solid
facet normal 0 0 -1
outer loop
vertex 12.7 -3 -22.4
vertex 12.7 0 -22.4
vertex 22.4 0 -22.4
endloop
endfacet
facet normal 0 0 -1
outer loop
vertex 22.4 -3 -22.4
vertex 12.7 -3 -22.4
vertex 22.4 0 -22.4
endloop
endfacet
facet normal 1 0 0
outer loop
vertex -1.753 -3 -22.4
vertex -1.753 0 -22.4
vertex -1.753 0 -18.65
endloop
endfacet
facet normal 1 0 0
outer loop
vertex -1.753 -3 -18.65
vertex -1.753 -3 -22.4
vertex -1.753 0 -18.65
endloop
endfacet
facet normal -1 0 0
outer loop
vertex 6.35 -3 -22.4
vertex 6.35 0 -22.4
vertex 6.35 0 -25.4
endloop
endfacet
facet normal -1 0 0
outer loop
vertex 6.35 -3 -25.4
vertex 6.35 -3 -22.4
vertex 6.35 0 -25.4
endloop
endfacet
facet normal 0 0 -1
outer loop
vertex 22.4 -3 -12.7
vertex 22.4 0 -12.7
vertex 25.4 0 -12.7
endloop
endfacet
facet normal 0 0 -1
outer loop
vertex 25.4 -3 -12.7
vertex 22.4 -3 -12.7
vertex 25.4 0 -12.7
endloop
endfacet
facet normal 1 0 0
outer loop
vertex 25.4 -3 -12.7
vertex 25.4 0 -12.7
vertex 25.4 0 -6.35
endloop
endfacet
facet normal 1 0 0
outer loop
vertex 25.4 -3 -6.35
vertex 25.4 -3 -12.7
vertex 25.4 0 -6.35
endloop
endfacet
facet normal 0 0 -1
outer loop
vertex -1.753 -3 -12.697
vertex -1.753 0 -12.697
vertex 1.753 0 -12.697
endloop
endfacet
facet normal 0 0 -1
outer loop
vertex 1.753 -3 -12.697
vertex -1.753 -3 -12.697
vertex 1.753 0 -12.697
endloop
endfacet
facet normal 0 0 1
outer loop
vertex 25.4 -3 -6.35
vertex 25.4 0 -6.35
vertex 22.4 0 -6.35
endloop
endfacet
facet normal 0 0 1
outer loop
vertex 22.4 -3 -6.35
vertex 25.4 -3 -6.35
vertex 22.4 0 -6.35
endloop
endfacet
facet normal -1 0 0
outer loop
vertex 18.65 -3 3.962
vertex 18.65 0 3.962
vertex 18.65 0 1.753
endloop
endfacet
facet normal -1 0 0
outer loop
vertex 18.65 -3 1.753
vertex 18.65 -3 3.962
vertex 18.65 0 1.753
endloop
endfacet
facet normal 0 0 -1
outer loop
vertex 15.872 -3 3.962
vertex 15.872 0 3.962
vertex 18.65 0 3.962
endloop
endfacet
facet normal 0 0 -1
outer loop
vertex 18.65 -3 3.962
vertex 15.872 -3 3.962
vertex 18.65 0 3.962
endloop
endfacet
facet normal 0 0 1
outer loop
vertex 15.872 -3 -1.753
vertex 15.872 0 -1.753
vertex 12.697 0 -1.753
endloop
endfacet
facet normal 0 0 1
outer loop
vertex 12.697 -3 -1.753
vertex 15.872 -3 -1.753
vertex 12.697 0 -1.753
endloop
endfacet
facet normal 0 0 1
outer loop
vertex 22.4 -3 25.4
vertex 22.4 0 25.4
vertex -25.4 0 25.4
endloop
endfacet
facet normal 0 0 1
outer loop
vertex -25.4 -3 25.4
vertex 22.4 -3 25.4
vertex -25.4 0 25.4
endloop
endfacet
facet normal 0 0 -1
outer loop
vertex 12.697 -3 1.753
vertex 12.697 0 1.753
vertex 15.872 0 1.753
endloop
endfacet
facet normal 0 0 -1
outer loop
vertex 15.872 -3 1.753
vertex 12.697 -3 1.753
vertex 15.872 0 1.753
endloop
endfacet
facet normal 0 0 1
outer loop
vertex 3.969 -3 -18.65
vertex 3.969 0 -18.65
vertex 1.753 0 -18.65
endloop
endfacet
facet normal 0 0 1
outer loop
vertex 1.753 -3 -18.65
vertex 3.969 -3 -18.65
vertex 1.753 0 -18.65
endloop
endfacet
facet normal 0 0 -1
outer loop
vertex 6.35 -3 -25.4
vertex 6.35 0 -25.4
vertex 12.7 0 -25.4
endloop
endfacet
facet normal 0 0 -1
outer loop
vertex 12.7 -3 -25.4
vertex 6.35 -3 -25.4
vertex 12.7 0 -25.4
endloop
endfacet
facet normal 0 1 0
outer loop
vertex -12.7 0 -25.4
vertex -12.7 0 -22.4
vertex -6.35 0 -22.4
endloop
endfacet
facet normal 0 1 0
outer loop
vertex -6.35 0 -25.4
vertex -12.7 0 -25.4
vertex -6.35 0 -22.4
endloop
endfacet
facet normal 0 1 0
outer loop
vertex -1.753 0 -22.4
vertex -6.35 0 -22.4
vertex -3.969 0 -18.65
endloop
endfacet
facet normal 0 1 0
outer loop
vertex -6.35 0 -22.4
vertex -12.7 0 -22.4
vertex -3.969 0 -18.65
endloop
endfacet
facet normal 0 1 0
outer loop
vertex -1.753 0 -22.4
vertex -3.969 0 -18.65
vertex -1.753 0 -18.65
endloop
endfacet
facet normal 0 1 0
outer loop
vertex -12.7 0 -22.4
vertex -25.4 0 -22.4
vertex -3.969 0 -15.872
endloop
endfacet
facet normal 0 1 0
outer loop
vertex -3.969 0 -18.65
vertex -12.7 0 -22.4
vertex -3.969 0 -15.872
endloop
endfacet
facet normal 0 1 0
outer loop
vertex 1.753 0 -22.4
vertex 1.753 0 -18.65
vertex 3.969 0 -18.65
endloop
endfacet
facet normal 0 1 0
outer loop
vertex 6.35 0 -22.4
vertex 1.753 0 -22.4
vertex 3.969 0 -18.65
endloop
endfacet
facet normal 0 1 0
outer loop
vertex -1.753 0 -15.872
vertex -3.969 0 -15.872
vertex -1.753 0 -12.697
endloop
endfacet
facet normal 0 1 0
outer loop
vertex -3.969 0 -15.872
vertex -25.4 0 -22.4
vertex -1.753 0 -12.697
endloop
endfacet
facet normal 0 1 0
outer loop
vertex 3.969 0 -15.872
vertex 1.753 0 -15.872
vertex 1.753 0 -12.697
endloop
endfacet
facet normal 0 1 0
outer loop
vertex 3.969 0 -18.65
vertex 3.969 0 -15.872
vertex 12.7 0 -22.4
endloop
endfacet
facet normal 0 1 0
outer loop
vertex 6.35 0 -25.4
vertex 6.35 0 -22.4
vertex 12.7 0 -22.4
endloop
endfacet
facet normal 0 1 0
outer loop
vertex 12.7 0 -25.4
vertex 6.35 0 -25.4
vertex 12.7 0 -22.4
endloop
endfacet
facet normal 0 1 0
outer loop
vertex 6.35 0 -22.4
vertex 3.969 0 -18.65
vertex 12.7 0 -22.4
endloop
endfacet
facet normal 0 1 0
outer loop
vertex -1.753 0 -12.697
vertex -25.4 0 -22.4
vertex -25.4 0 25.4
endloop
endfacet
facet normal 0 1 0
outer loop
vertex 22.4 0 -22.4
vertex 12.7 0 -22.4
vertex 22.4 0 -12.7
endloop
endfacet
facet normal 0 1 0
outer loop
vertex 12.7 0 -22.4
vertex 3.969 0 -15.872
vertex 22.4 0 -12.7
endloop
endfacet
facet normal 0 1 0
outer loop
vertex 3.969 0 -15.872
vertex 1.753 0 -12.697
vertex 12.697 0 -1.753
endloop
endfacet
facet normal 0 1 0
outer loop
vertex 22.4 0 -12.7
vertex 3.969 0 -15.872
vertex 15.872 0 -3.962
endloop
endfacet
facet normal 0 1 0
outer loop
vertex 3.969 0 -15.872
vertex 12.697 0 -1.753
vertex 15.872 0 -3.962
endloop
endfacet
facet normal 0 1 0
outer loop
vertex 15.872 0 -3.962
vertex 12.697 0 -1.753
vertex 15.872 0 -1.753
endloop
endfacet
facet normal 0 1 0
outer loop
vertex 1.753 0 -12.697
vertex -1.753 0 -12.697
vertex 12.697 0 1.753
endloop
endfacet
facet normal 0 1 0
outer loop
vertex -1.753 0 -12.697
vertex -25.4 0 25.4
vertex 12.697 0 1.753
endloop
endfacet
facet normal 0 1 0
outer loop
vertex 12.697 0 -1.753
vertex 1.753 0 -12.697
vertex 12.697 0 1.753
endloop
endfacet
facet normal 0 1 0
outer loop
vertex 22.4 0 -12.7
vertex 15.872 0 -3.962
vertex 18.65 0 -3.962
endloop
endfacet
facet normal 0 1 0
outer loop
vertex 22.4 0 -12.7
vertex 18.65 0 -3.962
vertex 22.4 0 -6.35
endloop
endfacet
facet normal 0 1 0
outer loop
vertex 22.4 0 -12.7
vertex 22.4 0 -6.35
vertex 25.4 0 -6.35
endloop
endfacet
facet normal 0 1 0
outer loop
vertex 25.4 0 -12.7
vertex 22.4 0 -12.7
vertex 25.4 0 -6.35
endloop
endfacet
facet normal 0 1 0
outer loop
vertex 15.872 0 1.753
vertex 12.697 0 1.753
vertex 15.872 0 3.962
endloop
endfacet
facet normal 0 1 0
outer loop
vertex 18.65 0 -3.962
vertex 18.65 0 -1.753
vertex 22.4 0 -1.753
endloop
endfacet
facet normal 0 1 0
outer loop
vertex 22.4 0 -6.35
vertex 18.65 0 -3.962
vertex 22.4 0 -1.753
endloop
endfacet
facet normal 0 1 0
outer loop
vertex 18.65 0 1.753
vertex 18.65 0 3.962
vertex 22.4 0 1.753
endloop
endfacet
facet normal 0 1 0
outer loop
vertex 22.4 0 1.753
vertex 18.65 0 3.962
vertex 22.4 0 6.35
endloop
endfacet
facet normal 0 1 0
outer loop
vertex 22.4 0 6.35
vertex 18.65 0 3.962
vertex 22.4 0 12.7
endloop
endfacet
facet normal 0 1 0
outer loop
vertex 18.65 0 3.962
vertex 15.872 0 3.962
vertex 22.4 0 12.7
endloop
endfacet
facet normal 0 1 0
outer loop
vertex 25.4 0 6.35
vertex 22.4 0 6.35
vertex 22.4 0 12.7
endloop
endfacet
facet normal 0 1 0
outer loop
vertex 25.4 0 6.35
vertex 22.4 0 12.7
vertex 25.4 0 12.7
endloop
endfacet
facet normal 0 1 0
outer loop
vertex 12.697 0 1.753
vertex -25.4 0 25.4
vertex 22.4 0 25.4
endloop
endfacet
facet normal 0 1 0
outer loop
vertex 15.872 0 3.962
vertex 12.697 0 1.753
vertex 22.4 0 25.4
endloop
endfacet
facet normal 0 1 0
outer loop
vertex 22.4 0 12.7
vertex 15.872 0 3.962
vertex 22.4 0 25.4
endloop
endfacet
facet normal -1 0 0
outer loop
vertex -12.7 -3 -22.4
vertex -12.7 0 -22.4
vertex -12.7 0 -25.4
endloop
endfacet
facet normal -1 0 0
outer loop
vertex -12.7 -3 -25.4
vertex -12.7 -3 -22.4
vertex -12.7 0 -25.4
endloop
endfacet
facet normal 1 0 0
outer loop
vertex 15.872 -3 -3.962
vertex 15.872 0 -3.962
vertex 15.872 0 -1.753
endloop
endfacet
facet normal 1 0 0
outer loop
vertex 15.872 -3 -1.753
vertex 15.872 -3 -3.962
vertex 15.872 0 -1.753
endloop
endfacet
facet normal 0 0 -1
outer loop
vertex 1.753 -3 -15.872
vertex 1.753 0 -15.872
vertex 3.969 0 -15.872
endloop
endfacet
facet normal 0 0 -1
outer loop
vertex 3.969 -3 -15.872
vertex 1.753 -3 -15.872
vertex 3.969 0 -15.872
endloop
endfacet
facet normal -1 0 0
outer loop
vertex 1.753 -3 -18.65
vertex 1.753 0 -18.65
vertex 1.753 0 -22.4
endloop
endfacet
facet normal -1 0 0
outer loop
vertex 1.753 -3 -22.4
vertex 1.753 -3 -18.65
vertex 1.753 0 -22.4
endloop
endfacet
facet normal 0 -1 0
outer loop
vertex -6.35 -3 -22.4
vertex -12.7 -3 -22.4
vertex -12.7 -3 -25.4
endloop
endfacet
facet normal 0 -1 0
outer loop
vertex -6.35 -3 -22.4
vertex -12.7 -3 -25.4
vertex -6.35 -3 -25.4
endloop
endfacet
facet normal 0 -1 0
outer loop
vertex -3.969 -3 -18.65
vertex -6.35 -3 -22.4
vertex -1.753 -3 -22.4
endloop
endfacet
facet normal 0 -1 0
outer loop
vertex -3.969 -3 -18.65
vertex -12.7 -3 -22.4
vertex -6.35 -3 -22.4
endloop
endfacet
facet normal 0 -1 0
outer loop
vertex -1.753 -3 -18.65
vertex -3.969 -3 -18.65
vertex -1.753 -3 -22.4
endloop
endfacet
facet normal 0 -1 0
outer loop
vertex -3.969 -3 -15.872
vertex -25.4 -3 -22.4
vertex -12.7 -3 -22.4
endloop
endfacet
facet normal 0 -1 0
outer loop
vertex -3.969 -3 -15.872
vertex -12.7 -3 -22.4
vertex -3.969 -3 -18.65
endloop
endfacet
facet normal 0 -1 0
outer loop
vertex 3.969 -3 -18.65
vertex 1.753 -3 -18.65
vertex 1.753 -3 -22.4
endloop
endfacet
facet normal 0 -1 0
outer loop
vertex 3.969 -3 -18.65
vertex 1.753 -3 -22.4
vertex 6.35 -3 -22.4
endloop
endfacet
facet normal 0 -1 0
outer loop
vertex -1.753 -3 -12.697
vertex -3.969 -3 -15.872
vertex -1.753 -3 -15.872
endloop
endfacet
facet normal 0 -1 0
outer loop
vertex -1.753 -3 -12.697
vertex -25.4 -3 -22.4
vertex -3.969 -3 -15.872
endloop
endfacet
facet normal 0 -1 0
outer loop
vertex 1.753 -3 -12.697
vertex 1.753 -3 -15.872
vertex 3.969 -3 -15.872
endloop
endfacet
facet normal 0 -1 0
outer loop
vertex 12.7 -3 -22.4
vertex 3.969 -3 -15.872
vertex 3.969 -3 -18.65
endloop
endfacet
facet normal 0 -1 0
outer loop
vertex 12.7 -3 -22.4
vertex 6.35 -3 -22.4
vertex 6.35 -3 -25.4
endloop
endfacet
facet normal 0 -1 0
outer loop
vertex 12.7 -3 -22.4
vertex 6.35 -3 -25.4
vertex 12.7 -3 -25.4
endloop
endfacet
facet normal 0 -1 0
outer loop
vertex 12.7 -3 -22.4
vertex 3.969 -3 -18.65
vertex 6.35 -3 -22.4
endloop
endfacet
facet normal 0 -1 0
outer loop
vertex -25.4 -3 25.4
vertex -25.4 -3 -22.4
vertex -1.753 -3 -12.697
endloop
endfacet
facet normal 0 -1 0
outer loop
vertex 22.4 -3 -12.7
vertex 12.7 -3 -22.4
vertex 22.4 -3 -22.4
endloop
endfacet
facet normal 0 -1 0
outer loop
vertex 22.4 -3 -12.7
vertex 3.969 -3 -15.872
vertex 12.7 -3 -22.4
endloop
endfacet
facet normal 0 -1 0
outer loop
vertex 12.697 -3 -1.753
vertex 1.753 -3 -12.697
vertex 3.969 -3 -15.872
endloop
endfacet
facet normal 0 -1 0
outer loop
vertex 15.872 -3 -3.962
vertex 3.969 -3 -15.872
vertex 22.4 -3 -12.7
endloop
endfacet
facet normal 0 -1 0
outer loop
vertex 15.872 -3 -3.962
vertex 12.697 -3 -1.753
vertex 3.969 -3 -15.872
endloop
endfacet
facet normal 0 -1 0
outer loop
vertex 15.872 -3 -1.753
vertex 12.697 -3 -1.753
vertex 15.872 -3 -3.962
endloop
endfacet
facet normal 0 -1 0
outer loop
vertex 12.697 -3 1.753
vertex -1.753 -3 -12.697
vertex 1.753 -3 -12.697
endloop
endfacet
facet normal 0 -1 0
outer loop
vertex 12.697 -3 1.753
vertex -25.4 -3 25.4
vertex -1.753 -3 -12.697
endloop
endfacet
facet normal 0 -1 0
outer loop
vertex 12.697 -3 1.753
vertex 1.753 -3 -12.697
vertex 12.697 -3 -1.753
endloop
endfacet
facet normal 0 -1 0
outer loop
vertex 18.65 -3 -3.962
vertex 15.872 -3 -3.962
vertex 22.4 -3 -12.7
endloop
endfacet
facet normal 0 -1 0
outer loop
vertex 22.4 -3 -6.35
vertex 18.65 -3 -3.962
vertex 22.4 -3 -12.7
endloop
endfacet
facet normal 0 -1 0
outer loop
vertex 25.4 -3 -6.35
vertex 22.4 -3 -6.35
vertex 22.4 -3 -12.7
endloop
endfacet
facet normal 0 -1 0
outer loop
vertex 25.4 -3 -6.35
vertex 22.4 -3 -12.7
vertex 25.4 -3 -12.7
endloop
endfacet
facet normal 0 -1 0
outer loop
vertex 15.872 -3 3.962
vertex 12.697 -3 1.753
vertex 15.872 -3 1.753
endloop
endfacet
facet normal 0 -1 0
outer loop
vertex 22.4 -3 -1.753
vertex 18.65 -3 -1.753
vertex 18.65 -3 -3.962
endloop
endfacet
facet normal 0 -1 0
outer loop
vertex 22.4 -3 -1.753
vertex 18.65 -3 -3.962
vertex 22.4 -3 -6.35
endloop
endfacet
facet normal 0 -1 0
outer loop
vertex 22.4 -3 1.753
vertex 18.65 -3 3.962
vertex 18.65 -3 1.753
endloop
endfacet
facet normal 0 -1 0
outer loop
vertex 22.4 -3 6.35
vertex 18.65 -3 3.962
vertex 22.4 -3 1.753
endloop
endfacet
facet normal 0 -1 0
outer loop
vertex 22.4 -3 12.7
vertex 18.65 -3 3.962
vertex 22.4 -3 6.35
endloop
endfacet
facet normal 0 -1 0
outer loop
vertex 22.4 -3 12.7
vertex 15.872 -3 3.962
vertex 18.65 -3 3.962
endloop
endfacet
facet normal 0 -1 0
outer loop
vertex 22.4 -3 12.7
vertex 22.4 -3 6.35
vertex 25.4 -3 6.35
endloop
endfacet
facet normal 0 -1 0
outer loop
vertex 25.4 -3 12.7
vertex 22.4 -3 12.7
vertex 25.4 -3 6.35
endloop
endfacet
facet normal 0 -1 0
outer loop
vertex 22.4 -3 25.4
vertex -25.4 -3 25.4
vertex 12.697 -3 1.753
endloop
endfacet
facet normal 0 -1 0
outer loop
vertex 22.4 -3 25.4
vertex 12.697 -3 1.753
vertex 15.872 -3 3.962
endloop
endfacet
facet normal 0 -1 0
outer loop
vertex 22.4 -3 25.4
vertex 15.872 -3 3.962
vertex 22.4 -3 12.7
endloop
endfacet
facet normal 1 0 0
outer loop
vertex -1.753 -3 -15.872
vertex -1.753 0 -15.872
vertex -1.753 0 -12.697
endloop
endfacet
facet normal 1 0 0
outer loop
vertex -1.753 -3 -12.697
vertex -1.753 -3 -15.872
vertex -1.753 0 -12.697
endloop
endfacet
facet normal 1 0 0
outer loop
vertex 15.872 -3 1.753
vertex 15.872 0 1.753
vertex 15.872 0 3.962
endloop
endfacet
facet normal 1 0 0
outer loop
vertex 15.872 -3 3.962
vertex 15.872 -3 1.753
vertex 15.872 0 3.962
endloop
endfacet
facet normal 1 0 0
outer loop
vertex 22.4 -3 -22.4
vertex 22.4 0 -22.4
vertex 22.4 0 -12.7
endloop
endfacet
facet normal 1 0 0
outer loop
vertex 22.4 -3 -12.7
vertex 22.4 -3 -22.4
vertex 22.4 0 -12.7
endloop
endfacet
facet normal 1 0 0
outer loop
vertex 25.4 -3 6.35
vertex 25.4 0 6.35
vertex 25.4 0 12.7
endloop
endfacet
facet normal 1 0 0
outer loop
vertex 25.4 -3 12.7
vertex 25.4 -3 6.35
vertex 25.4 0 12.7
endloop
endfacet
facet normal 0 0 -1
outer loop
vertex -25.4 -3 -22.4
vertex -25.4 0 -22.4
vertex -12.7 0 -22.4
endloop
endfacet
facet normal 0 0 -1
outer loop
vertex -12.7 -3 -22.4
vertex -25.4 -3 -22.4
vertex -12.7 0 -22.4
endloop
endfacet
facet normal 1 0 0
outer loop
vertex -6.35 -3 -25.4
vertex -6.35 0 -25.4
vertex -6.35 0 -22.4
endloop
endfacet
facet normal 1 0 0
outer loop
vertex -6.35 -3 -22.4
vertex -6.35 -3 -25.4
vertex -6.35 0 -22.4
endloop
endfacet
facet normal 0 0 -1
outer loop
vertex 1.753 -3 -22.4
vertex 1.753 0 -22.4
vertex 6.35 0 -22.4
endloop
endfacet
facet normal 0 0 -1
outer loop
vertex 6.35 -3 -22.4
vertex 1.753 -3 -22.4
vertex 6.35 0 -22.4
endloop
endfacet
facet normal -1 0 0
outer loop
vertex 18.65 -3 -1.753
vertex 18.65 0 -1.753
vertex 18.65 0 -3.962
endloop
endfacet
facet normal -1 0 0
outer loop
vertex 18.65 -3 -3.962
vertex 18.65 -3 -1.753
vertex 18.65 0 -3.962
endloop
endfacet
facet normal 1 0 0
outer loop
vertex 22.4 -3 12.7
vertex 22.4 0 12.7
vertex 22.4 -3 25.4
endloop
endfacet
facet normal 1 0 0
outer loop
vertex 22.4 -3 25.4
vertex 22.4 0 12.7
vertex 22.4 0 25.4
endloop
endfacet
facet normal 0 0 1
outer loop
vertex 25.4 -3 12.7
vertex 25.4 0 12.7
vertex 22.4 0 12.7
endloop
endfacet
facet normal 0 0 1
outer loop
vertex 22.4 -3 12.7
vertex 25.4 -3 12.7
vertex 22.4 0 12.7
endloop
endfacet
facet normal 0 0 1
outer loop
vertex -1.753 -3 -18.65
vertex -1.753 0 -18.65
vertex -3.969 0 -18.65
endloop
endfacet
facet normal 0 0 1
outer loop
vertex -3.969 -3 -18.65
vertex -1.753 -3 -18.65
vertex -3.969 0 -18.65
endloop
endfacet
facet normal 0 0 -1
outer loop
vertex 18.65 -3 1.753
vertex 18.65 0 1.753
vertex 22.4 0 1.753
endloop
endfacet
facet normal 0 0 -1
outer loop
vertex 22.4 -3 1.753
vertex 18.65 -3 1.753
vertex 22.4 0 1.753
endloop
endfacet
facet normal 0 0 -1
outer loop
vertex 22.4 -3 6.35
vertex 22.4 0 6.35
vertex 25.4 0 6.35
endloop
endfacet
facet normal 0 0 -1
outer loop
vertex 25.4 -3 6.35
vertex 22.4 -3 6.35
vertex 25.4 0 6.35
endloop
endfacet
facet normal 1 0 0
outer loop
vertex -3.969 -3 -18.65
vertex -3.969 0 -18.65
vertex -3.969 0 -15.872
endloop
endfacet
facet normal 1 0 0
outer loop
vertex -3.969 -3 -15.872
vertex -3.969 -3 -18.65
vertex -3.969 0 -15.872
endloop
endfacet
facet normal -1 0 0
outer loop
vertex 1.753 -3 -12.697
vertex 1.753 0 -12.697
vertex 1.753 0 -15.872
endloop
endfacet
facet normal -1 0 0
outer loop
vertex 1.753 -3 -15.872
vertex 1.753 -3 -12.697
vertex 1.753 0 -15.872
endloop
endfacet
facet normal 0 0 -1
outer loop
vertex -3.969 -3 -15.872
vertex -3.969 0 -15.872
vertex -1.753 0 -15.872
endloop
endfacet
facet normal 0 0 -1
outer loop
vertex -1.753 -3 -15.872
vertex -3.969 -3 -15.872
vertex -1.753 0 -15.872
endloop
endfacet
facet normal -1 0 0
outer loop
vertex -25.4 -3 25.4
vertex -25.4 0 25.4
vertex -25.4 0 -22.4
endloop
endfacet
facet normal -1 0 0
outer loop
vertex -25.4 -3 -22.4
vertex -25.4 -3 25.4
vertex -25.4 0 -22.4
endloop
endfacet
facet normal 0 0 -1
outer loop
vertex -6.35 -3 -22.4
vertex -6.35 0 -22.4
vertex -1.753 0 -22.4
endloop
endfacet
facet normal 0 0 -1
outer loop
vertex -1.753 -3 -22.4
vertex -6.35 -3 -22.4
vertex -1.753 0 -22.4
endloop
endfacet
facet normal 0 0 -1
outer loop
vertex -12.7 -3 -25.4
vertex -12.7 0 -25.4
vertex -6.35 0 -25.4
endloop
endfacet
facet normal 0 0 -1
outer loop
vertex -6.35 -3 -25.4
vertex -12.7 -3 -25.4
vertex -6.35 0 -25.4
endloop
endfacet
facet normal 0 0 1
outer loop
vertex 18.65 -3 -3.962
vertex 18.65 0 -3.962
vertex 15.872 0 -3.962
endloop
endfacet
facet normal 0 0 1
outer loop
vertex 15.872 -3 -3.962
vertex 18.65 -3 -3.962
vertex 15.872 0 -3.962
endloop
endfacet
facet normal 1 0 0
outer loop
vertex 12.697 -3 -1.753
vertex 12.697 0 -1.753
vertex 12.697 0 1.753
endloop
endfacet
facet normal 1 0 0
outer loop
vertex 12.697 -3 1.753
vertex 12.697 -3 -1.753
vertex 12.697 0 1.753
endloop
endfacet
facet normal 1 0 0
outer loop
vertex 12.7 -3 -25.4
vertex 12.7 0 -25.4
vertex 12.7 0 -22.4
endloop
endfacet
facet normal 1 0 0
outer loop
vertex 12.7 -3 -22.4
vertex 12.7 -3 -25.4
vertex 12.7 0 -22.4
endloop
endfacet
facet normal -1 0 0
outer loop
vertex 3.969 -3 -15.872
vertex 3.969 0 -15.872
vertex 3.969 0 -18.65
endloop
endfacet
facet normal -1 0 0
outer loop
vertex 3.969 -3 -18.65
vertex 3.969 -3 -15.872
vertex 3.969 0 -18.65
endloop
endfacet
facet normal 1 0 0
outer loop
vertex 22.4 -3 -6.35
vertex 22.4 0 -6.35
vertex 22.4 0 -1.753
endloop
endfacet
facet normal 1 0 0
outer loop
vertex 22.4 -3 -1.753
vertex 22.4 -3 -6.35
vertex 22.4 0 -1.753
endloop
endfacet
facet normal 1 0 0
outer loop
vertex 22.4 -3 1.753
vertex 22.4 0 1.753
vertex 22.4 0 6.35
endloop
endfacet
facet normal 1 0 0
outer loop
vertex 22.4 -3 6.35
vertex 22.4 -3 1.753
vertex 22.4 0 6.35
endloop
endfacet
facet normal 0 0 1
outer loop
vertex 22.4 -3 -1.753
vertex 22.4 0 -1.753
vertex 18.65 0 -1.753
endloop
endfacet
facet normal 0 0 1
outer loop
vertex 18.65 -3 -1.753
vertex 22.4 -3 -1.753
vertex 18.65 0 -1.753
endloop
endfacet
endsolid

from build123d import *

# Parameters (mm, degrees)
F1_DEPTH = 3


with BuildPart() as f1:
    # F0 (on Front) → F1 (new body)
    with BuildSketch(Plane.XZ):
        Polygon((22.4, 25.4), (-25.4, 25.4), (-25.4, -22.4), (-12.7, -22.4), (-12.7, -25.4), (-6.35, -25.4), (-6.35, -22.4), (-1.7526, -22.4), (-1.7526, -18.650325), (-3.96875, -18.650325), (-3.96875, -15.8722), (-1.7526, -15.8722), (-1.7526, -12.6972), (1.7526, -12.6972), (1.7526, -15.8722), (3.96875, -15.8722), (3.96875, -18.650325), (1.7526, -18.650325), (1.7526, -22.4), (6.35, -22.4), (6.35, -25.4), (12.7, -25.4), (12.7, -22.4), (22.4, -22.4), (22.4, -12.7), (25.4, -12.7), (25.4, -6.35), (22.4, -6.35), (22.4, -1.7526), (18.650325, -1.7526), (18.650325, -3.9624), (15.8722, -3.9624), (15.8722, -1.7526), (12.6972, -1.7526), (12.6972, 1.7526), (15.8722, 1.7526), (15.8722, 3.9624), (18.650325, 3.9624), (18.650325, 1.7526), (22.4, 1.7526), (22.4, 6.35), (25.4, 6.35), (25.4, 12.7), (22.4, 12.7), align=None)
    extrude(amount=F1_DEPTH)


solid = f1.part
